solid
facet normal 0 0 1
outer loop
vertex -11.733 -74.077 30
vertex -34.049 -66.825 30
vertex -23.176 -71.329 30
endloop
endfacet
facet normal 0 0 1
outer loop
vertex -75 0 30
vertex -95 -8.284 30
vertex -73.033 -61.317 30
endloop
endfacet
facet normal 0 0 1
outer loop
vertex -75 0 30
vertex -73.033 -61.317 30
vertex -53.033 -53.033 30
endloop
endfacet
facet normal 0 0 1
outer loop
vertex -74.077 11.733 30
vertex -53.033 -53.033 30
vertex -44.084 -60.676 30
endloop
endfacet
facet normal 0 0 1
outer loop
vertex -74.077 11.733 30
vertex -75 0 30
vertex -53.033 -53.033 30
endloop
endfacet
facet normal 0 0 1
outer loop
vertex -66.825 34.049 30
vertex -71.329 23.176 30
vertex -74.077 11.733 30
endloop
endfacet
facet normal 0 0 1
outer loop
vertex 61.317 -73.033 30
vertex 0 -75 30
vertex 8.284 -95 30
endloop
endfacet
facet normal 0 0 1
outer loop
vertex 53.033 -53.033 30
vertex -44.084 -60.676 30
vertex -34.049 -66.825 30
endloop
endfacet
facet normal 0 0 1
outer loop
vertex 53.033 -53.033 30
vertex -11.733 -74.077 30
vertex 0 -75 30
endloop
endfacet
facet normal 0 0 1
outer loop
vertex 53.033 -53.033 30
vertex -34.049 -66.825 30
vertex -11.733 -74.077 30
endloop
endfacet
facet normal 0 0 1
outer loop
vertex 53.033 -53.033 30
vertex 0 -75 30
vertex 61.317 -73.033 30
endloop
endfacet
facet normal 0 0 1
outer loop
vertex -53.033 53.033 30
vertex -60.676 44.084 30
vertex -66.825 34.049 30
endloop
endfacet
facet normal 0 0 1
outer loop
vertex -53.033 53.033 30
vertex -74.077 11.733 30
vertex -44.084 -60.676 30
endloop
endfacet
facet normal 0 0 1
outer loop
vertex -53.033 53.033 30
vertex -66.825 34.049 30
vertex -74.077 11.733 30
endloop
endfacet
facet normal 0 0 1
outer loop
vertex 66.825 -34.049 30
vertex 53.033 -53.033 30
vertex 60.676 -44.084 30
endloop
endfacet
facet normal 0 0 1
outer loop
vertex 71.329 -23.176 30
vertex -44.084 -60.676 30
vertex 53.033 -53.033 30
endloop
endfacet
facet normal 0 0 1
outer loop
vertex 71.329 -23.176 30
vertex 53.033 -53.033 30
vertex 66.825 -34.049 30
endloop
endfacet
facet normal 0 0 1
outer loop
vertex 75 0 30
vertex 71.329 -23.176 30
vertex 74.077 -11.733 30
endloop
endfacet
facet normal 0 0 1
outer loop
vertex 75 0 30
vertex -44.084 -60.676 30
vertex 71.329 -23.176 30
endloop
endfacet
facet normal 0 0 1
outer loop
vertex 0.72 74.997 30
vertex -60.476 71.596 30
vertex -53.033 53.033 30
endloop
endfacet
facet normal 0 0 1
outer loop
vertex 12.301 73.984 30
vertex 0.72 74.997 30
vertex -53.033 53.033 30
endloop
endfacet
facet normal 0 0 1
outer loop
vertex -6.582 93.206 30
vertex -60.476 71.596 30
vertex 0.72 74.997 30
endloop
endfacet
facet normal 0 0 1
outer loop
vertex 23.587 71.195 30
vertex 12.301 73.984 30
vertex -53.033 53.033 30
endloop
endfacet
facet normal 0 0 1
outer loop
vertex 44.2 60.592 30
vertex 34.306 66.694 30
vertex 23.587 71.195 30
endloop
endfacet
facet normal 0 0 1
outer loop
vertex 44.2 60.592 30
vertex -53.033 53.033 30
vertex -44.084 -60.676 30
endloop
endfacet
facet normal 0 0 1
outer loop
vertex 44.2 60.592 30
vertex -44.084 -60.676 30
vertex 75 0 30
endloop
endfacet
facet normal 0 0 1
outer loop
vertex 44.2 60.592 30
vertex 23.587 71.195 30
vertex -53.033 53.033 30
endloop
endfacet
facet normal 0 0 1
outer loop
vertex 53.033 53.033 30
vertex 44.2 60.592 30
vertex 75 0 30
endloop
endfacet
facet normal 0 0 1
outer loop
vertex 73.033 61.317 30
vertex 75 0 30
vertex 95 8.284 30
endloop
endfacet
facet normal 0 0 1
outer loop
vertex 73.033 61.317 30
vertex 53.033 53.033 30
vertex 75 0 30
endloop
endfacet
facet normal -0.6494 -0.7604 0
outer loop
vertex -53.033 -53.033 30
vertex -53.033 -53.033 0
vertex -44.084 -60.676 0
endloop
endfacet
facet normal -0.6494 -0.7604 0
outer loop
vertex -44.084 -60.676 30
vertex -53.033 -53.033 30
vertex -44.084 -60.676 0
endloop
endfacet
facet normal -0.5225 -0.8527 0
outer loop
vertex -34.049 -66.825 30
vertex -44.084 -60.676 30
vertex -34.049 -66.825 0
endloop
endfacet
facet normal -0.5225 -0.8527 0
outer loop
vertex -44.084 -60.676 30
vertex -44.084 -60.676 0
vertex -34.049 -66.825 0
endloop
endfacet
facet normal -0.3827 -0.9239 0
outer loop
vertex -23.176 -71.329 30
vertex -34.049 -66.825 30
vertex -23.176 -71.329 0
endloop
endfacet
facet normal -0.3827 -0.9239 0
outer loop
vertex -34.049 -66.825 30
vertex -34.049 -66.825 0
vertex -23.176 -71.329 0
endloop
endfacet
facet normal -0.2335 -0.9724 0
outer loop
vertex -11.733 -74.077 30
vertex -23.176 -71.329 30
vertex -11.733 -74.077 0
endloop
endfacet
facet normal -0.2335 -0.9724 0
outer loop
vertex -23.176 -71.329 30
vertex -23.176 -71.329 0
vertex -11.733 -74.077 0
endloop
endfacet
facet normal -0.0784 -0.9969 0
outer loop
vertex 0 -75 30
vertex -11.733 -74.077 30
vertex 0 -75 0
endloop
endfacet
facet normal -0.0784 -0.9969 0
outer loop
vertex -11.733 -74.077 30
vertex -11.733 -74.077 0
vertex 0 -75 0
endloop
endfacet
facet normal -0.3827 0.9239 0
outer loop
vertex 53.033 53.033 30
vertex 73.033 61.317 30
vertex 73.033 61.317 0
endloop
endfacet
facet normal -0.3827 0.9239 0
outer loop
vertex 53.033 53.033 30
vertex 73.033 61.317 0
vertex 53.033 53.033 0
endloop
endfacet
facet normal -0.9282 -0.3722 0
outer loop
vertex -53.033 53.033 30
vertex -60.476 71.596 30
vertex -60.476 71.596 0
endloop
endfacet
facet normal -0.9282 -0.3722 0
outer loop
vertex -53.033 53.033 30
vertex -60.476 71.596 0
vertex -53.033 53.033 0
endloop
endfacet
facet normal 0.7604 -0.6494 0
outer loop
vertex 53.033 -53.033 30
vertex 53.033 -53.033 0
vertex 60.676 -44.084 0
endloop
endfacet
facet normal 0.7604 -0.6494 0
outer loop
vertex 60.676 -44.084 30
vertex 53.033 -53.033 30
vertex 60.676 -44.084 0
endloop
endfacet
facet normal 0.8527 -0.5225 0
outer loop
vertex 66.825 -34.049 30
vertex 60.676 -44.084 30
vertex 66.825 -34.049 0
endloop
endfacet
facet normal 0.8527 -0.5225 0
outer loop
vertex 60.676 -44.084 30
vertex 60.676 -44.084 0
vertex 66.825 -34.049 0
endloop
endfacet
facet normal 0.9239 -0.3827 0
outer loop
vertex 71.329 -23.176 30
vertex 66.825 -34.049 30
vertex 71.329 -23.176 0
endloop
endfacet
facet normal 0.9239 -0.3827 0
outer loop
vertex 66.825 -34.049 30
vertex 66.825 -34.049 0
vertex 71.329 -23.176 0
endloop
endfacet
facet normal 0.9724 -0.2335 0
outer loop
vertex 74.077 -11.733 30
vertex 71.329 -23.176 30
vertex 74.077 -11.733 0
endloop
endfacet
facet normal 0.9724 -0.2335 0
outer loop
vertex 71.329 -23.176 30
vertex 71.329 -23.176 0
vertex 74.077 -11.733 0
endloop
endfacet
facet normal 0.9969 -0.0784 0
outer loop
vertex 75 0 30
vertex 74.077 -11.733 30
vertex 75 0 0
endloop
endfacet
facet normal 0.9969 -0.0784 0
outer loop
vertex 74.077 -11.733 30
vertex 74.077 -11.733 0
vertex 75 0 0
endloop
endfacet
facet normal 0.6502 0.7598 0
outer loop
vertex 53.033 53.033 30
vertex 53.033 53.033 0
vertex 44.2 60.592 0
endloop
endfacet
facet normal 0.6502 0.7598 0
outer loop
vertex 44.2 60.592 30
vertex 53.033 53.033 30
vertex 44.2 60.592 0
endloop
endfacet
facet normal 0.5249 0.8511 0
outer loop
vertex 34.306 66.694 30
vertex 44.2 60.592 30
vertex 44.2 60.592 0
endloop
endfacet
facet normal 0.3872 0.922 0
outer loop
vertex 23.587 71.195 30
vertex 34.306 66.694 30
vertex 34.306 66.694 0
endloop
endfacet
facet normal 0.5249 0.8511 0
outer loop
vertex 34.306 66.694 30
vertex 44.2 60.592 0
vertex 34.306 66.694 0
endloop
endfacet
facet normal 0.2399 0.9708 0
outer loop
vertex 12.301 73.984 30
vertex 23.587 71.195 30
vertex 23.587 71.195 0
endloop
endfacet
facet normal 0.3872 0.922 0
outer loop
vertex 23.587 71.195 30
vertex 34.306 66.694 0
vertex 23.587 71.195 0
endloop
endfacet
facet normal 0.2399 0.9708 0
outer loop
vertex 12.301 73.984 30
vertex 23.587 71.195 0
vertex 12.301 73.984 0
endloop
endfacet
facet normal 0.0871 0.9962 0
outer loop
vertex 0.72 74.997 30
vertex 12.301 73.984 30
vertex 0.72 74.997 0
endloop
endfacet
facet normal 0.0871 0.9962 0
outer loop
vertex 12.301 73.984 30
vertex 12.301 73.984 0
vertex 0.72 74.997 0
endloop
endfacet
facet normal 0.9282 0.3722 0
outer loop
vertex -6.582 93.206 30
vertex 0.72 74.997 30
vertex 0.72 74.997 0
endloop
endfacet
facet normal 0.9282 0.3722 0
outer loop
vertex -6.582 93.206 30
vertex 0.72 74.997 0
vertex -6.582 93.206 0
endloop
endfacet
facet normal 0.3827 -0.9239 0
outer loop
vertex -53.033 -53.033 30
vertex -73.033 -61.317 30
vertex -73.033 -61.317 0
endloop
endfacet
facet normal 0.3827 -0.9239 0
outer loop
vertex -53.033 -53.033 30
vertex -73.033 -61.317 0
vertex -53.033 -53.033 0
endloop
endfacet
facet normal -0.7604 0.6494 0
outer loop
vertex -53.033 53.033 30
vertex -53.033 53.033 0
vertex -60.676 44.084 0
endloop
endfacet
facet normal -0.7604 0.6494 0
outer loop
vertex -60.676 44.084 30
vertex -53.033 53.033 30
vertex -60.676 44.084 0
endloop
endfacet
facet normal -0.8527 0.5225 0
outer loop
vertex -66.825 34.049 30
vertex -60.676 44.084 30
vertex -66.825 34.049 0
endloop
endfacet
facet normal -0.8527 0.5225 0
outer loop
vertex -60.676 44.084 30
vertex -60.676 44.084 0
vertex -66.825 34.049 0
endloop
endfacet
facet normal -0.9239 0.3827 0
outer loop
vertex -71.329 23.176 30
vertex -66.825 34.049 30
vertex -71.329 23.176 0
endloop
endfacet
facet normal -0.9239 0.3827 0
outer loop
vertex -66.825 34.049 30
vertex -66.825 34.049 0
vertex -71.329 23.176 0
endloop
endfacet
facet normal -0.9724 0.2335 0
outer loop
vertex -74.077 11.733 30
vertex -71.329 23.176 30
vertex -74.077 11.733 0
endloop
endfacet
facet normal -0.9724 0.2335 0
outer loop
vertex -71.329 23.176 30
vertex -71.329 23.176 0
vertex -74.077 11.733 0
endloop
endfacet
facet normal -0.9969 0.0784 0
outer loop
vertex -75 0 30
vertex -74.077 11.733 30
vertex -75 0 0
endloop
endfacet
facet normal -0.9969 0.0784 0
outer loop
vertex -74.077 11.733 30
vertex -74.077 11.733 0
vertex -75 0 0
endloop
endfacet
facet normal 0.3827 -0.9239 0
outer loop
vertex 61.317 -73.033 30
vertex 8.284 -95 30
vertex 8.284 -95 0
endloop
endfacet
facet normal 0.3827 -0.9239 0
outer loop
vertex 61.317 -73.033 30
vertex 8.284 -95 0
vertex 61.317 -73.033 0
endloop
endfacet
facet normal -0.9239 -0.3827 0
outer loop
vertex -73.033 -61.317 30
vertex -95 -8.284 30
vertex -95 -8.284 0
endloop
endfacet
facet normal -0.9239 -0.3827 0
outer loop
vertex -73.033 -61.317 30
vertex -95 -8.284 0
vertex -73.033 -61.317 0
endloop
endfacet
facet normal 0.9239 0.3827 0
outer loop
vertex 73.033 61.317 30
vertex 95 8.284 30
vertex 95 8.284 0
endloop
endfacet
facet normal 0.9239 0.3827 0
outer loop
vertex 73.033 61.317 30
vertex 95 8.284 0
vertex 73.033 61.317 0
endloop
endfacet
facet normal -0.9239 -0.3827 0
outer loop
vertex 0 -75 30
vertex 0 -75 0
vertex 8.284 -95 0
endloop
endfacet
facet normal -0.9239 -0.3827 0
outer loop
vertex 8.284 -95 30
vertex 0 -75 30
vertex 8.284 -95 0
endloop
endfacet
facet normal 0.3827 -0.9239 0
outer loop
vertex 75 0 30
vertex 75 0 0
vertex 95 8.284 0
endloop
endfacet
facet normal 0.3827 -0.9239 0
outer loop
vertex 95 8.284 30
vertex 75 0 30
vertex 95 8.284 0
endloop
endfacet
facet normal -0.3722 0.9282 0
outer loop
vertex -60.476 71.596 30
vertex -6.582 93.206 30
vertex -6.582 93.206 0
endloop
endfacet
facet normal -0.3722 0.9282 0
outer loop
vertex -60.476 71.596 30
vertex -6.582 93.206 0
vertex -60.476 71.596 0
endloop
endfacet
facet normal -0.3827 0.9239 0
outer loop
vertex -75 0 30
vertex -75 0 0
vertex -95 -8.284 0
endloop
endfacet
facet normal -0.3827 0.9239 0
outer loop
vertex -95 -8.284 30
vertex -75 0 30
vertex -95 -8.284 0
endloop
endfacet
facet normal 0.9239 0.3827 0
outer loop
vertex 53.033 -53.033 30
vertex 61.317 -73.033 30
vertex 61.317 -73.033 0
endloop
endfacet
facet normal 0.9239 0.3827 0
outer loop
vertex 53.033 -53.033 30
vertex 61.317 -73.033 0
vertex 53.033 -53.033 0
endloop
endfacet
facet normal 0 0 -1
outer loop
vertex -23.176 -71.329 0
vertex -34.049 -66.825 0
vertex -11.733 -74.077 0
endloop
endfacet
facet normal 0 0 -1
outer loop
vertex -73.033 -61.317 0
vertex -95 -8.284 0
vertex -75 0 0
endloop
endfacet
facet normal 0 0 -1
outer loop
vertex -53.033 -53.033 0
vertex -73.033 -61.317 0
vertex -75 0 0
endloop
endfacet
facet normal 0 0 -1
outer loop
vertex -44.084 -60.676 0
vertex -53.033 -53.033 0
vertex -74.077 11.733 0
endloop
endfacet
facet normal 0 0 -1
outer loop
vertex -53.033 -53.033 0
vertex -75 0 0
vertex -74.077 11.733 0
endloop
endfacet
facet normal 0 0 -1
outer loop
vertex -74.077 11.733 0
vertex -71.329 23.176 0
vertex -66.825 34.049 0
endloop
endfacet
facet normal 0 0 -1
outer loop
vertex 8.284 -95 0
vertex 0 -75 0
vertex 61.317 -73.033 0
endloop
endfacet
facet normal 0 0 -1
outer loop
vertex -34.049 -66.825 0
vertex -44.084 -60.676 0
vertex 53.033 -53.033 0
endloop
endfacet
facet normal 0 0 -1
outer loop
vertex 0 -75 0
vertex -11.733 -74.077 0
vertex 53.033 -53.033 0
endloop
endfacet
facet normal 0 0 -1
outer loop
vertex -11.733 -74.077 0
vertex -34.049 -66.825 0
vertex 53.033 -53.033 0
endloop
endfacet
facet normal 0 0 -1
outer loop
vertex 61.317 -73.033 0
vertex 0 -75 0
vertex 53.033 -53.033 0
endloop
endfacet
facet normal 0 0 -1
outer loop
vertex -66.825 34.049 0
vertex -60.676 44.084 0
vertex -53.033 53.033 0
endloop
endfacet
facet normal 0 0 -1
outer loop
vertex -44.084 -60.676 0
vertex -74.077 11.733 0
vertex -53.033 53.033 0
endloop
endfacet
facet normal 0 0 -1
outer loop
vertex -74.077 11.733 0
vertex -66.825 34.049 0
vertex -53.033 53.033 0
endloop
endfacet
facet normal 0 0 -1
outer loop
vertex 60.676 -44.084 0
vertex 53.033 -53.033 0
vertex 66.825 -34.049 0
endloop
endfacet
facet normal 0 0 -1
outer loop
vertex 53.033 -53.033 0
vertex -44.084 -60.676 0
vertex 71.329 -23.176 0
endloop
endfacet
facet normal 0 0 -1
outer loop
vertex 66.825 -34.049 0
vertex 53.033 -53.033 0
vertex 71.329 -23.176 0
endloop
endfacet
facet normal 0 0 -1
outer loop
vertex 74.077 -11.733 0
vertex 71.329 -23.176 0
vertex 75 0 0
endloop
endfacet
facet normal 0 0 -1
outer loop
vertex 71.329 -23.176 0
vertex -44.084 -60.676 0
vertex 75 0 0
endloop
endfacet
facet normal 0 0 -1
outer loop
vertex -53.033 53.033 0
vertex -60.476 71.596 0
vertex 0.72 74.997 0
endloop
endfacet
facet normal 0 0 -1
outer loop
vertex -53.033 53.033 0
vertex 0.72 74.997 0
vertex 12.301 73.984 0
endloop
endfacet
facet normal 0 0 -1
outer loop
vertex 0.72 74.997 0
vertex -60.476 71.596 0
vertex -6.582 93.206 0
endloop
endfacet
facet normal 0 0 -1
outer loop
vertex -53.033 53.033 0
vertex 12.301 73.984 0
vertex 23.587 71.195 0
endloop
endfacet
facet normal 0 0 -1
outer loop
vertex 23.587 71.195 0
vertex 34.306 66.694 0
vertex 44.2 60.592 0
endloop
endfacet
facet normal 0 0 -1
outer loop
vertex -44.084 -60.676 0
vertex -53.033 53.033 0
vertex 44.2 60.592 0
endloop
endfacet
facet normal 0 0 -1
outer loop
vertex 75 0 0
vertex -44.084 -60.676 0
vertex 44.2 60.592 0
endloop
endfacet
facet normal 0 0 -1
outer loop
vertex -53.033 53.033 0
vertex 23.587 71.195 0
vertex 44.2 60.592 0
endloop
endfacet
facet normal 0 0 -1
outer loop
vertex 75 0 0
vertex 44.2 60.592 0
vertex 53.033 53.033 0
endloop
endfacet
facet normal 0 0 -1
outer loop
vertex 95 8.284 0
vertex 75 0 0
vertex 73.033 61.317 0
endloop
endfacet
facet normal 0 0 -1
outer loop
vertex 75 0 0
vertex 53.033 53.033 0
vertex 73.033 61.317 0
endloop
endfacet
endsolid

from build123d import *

# Parameters (mm, degrees)
SKETCH1_R           = 75
BOSS_EXTRUDE1_DEPTH = 30
BOSS_EXTRUDE2_DEPTH = 30


with BuildPart() as part:
    # Sketch1 → Boss-Extrude1 (new body)
    with BuildSketch(Plane.XY):
        Circle(SKETCH1_R)
    extrude(amount=BOSS_EXTRUDE1_DEPTH)

    # Sketch4 → Boss-Extrude2 (add)
    with BuildSketch(Plane.XY.offset(30)):
        with BuildLine():
            Line((61.317279836, -73.033008589), (53.033008589, -53.033008589))
            ThreePointArc((53.033008589, -53.033008589), (28.701257427, -69.290964938), (0, -75))
            Line((0, -75), (8.284271247, -95))
            Line((8.284271247, -95), (61.317279836, -73.033008589))
        make_face()
        with BuildLine():
            ThreePointArc((53.033008589, 53.033008589), (69.290964938, 28.701257427), (75, 0))
            Line((75, 0), (95, 8.284271247))
            Line((95, 8.284271247), (73.033008589, 61.317279836))
            Line((73.033008589, 61.317279836), (53.033008589, 53.033008589))
        make_face()
        with BuildLine():
            Line((-73.033008589, -61.317279836), (-53.033008589, -53.033008589))
            ThreePointArc((-53.033008589, -53.033008589), (-69.290964938, -28.701257427), (-75, 0))
            Line((-75, 0), (-95, -8.284271247))
            Line((-95, -8.284271247), (-73.033008589, -61.317279836))
        make_face()
        with BuildLine():
            ThreePointArc((0, 75), (0.359885979, 74.999136542), (0.719763671, 74.996546189))
            Line((0.719763671, 74.996546189), (-6.58190731, 93.206479314))
            Line((-6.58190731, 93.206479314), (-60.476372238, 71.596314803))
            Line((-60.476372238, 71.596314803), (-53.033008589, 53.033008589))
            ThreePointArc((-53.033008589, 53.033008589), (-28.701257427, 69.290964938), (0, 75))
        make_face()
    extrude(amount=-BOSS_EXTRUDE2_DEPTH)


solid = part.part
